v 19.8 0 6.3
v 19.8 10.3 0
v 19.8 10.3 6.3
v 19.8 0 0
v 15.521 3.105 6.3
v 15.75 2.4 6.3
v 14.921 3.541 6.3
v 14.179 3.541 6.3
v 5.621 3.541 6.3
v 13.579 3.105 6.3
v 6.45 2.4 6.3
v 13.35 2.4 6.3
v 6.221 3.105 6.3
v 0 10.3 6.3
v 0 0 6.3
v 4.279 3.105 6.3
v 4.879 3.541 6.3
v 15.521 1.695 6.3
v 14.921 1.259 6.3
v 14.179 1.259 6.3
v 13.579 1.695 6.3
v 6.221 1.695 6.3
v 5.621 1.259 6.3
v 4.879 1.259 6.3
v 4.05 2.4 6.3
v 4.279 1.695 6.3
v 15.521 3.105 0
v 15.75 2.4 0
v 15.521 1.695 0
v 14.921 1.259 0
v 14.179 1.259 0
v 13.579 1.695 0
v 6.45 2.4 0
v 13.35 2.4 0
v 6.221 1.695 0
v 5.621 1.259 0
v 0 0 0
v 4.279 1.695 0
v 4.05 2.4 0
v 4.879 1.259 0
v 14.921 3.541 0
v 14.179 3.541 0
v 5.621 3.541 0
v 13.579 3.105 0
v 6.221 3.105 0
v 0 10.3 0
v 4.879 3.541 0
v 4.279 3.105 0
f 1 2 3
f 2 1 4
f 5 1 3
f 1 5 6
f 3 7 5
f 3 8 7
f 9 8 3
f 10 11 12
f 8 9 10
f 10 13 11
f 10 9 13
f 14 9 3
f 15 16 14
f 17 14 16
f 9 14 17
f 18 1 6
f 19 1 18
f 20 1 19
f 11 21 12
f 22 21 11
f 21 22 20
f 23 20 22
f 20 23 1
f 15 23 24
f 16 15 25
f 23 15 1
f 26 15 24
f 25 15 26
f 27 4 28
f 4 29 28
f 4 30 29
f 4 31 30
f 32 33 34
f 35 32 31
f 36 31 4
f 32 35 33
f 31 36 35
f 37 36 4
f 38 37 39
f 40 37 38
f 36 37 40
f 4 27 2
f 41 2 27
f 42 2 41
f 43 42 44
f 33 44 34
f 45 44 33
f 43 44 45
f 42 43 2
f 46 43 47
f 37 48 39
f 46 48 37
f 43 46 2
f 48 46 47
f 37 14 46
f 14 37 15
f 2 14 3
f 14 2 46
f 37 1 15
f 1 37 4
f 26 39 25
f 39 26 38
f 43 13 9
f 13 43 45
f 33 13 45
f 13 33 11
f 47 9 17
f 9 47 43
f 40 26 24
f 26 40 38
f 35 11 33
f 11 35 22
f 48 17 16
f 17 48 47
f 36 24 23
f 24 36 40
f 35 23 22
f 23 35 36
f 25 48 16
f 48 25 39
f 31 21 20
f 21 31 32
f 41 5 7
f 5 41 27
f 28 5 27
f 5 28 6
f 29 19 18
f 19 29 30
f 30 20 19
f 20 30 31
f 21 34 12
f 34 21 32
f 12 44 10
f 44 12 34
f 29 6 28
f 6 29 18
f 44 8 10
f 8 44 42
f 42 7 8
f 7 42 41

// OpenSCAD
function LimitSwitchBoxHeight()=10.3;
function LimitSwitchBoxThickness()= 6.3;
function LimitSwitchBoxLength()=19.8;

function LimitSwitchHoleDiam()=2.4;
function LimitSwitchHoleTopInset()=2.4; 
function LimitSwitchHoleSideInset()=5.25; 

function LimitSwitchWidth(3dPrinterTolerance=1)= 4+3dPrinterTolerance;
function LimitSwitchLength()=16;
function LimitSwitchCurveDiam(3dPrinterTolerance=2)=2.7+3dPrinterTolerance;

module LimitSwitch()
{
	difference()
	{
		cube([ LimitSwitchBoxLength(),LimitSwitchBoxHeight(), LimitSwitchBoxThickness()]);
		translate([LimitSwitchHoleSideInset(),LimitSwitchHoleTopInset(),-1])
		{
			cylinder(r=LimitSwitchHoleDiam()/2, h=LimitSwitchBoxThickness()+2, $fn=10);	
		}	
		translate([LimitSwitchBoxLength()-LimitSwitchHoleSideInset(),LimitSwitchHoleTopInset(),-1])
		{
			cylinder(r=LimitSwitchHoleDiam()/2, h=LimitSwitchBoxThickness()+2, $fn=10);	
		}	
	}
}

LimitSwitch();
